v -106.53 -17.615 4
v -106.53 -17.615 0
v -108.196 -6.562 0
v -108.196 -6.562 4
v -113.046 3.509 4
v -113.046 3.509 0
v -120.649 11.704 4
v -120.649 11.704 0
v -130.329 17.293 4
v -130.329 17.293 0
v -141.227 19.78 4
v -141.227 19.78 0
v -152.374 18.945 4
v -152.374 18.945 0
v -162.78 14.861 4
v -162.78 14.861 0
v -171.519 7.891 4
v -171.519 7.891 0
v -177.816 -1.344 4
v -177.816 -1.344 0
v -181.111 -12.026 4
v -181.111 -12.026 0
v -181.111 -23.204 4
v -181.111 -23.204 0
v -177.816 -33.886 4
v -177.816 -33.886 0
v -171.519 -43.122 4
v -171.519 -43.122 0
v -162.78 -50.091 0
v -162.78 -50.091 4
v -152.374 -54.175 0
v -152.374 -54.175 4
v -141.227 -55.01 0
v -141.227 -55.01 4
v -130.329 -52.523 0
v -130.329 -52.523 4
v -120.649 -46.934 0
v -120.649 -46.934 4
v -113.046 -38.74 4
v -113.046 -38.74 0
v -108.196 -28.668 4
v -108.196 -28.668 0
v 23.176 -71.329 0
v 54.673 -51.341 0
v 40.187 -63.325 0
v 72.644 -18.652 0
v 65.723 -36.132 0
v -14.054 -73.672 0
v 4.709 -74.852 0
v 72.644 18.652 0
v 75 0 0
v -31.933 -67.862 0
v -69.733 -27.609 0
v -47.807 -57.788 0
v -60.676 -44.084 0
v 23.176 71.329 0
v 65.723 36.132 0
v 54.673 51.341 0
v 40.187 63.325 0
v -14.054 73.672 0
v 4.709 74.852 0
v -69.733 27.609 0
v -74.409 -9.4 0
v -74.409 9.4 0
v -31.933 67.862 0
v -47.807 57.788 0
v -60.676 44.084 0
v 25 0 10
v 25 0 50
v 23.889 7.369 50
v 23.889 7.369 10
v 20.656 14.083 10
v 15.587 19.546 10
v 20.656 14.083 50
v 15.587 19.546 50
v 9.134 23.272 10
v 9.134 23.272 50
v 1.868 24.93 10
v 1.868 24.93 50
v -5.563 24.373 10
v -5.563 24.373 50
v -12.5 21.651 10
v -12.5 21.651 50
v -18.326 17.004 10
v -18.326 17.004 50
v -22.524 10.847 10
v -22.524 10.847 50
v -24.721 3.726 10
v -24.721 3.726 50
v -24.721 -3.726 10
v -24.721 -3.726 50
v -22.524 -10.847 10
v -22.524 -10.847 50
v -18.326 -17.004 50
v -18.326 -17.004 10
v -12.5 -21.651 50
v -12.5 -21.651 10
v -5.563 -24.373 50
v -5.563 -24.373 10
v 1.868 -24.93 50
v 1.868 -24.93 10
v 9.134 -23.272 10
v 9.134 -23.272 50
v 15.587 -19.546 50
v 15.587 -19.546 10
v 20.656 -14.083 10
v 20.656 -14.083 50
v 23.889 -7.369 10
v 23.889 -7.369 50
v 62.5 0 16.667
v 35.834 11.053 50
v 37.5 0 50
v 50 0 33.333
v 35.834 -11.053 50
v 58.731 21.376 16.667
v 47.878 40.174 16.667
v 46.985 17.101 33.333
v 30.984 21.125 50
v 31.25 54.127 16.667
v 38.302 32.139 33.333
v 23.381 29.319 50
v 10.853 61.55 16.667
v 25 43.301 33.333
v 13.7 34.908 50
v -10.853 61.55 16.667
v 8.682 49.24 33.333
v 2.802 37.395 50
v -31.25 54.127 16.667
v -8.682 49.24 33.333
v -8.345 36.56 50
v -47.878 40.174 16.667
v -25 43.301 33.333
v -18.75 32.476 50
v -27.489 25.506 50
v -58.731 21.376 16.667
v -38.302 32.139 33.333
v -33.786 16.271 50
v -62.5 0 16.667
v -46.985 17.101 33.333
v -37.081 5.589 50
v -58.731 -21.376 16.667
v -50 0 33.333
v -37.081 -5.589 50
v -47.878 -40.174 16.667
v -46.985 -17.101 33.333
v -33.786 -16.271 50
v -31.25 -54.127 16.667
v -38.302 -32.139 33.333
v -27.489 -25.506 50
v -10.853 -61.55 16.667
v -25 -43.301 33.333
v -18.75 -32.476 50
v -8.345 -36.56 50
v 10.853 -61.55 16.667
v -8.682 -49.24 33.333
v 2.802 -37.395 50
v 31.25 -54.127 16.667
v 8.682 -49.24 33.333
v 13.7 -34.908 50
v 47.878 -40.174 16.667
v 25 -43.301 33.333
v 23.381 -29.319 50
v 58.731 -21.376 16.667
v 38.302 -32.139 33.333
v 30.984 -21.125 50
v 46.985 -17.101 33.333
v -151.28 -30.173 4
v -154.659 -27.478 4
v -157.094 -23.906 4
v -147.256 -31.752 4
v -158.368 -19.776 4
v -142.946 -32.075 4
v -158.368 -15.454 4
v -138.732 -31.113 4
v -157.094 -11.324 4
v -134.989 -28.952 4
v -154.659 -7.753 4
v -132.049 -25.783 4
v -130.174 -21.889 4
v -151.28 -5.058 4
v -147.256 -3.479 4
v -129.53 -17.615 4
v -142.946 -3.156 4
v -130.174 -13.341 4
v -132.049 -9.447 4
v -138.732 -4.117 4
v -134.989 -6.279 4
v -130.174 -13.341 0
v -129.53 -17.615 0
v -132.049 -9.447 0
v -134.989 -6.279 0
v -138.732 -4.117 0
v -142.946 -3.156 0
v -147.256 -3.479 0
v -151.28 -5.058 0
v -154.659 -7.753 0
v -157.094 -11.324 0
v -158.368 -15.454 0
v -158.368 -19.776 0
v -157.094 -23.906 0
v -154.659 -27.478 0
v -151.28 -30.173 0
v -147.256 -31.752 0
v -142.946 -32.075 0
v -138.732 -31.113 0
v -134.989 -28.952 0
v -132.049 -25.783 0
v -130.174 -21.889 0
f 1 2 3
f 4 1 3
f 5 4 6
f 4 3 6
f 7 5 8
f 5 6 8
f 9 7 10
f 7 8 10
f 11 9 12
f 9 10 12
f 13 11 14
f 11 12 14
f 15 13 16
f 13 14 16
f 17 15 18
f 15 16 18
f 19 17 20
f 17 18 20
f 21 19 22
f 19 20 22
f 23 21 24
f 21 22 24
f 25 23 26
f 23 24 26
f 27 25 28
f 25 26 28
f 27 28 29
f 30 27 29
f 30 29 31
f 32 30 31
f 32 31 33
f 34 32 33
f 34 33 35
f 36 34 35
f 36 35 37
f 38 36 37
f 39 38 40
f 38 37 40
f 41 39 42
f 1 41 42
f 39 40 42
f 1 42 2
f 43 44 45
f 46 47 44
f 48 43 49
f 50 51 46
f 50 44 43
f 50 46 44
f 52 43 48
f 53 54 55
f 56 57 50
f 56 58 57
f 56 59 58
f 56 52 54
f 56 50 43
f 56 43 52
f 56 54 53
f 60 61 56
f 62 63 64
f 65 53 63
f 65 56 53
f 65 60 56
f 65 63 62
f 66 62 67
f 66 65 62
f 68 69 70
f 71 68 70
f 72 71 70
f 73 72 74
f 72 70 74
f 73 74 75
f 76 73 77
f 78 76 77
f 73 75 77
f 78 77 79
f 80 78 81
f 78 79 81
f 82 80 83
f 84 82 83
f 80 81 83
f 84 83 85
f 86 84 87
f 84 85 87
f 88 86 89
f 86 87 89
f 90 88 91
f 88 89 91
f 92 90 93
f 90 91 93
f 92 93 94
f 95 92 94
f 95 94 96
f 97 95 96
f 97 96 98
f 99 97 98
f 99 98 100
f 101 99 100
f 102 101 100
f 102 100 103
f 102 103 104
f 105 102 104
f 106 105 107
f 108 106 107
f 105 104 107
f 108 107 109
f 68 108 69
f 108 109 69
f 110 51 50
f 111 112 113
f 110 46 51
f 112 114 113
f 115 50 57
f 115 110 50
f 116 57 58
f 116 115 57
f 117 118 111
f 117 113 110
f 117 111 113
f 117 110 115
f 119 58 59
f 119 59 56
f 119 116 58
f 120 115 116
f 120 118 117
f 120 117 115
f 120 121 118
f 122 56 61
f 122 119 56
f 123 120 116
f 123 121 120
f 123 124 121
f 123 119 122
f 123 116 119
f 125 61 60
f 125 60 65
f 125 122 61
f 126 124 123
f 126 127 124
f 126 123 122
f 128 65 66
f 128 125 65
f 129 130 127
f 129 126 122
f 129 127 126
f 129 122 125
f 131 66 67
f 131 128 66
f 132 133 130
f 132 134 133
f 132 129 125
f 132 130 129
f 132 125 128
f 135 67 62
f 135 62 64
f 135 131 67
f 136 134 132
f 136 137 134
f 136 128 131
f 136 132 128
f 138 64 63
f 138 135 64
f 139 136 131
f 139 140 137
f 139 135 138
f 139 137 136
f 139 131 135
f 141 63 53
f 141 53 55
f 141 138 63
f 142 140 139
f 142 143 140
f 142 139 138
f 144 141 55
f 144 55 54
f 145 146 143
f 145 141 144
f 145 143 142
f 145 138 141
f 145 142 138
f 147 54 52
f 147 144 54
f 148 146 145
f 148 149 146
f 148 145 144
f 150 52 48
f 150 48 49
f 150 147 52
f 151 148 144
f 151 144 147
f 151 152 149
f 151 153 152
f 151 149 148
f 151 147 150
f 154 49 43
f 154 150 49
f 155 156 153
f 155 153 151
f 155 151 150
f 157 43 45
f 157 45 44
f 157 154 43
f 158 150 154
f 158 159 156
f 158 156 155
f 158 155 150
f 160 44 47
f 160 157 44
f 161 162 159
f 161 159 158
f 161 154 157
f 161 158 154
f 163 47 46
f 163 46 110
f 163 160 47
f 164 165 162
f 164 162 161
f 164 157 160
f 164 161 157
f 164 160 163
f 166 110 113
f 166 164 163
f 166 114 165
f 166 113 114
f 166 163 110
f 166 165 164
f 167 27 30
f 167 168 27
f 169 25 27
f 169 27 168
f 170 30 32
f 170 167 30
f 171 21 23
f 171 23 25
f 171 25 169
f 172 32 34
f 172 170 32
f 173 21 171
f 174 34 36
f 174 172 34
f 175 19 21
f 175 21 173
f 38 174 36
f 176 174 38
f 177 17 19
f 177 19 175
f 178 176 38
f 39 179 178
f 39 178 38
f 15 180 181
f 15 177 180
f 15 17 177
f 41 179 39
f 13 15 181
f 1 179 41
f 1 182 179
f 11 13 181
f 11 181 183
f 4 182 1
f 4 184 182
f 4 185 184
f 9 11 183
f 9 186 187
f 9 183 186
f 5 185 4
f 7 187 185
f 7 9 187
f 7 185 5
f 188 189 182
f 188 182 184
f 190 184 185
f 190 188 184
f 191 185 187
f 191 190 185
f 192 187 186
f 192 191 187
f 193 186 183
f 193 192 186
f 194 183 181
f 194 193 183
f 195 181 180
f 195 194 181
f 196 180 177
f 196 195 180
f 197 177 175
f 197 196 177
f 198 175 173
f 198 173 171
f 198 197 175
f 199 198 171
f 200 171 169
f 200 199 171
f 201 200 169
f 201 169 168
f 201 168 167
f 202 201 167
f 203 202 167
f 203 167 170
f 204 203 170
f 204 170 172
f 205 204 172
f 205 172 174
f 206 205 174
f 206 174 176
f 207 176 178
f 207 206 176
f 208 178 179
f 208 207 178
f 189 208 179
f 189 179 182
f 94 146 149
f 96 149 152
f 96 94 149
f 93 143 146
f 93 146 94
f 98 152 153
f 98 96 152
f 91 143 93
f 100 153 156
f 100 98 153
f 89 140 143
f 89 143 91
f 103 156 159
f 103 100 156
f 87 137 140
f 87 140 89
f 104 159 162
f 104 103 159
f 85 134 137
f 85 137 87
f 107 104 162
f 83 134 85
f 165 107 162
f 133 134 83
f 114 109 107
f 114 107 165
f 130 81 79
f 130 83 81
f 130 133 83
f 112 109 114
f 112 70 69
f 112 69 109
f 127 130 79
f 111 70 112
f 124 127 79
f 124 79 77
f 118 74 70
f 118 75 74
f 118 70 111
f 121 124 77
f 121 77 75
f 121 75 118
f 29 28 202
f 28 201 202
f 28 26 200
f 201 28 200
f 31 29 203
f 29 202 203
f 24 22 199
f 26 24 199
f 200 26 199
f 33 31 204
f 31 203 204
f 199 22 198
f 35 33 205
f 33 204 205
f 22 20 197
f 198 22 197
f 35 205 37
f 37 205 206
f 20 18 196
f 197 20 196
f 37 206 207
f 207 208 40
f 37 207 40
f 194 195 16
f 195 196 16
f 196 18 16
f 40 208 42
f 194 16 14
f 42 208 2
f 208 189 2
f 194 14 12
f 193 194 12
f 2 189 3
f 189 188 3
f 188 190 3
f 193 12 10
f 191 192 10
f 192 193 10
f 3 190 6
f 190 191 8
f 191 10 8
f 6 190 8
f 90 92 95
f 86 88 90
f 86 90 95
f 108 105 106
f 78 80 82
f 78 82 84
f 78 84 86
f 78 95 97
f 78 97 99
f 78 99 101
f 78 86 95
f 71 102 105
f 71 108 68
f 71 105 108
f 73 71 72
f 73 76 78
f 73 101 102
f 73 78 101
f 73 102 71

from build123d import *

# Parameters (mm, degrees)
F2_R     = 25
F3_DEPTH = 40
F4_R     = 37.5
F4_R_2   = 14.5
F5_DEPTH = 4


with BuildPart() as f1:
    # F0 (on Front) → F1 (revolve)
    with BuildSketch(Plane.XZ):
        Polygon((0, 50), (0, 0), (75, 0), (37.5, 50), align=None)
    revolve(axis=Axis((0, 0, 25), (0, 0, 1)))

    # F2 (on face) → F3 (cut)
    with BuildSketch(Plane.XY.offset(50)):
        Circle(F2_R)
    extrude(amount=-F3_DEPTH, mode=Mode.SUBTRACT)


with BuildPart() as f5:
    # F4 (on Top) → F5 (new body)
    with BuildSketch(Plane.XY):
        with Locations((-144.029602, -17.615132)):
            Circle(F4_R)
        with Locations((-144.029602, -17.615132)):
            Circle(F4_R_2, mode=Mode.SUBTRACT)
    extrude(amount=F5_DEPTH)


solid = Compound([f1.part, f5.part])
